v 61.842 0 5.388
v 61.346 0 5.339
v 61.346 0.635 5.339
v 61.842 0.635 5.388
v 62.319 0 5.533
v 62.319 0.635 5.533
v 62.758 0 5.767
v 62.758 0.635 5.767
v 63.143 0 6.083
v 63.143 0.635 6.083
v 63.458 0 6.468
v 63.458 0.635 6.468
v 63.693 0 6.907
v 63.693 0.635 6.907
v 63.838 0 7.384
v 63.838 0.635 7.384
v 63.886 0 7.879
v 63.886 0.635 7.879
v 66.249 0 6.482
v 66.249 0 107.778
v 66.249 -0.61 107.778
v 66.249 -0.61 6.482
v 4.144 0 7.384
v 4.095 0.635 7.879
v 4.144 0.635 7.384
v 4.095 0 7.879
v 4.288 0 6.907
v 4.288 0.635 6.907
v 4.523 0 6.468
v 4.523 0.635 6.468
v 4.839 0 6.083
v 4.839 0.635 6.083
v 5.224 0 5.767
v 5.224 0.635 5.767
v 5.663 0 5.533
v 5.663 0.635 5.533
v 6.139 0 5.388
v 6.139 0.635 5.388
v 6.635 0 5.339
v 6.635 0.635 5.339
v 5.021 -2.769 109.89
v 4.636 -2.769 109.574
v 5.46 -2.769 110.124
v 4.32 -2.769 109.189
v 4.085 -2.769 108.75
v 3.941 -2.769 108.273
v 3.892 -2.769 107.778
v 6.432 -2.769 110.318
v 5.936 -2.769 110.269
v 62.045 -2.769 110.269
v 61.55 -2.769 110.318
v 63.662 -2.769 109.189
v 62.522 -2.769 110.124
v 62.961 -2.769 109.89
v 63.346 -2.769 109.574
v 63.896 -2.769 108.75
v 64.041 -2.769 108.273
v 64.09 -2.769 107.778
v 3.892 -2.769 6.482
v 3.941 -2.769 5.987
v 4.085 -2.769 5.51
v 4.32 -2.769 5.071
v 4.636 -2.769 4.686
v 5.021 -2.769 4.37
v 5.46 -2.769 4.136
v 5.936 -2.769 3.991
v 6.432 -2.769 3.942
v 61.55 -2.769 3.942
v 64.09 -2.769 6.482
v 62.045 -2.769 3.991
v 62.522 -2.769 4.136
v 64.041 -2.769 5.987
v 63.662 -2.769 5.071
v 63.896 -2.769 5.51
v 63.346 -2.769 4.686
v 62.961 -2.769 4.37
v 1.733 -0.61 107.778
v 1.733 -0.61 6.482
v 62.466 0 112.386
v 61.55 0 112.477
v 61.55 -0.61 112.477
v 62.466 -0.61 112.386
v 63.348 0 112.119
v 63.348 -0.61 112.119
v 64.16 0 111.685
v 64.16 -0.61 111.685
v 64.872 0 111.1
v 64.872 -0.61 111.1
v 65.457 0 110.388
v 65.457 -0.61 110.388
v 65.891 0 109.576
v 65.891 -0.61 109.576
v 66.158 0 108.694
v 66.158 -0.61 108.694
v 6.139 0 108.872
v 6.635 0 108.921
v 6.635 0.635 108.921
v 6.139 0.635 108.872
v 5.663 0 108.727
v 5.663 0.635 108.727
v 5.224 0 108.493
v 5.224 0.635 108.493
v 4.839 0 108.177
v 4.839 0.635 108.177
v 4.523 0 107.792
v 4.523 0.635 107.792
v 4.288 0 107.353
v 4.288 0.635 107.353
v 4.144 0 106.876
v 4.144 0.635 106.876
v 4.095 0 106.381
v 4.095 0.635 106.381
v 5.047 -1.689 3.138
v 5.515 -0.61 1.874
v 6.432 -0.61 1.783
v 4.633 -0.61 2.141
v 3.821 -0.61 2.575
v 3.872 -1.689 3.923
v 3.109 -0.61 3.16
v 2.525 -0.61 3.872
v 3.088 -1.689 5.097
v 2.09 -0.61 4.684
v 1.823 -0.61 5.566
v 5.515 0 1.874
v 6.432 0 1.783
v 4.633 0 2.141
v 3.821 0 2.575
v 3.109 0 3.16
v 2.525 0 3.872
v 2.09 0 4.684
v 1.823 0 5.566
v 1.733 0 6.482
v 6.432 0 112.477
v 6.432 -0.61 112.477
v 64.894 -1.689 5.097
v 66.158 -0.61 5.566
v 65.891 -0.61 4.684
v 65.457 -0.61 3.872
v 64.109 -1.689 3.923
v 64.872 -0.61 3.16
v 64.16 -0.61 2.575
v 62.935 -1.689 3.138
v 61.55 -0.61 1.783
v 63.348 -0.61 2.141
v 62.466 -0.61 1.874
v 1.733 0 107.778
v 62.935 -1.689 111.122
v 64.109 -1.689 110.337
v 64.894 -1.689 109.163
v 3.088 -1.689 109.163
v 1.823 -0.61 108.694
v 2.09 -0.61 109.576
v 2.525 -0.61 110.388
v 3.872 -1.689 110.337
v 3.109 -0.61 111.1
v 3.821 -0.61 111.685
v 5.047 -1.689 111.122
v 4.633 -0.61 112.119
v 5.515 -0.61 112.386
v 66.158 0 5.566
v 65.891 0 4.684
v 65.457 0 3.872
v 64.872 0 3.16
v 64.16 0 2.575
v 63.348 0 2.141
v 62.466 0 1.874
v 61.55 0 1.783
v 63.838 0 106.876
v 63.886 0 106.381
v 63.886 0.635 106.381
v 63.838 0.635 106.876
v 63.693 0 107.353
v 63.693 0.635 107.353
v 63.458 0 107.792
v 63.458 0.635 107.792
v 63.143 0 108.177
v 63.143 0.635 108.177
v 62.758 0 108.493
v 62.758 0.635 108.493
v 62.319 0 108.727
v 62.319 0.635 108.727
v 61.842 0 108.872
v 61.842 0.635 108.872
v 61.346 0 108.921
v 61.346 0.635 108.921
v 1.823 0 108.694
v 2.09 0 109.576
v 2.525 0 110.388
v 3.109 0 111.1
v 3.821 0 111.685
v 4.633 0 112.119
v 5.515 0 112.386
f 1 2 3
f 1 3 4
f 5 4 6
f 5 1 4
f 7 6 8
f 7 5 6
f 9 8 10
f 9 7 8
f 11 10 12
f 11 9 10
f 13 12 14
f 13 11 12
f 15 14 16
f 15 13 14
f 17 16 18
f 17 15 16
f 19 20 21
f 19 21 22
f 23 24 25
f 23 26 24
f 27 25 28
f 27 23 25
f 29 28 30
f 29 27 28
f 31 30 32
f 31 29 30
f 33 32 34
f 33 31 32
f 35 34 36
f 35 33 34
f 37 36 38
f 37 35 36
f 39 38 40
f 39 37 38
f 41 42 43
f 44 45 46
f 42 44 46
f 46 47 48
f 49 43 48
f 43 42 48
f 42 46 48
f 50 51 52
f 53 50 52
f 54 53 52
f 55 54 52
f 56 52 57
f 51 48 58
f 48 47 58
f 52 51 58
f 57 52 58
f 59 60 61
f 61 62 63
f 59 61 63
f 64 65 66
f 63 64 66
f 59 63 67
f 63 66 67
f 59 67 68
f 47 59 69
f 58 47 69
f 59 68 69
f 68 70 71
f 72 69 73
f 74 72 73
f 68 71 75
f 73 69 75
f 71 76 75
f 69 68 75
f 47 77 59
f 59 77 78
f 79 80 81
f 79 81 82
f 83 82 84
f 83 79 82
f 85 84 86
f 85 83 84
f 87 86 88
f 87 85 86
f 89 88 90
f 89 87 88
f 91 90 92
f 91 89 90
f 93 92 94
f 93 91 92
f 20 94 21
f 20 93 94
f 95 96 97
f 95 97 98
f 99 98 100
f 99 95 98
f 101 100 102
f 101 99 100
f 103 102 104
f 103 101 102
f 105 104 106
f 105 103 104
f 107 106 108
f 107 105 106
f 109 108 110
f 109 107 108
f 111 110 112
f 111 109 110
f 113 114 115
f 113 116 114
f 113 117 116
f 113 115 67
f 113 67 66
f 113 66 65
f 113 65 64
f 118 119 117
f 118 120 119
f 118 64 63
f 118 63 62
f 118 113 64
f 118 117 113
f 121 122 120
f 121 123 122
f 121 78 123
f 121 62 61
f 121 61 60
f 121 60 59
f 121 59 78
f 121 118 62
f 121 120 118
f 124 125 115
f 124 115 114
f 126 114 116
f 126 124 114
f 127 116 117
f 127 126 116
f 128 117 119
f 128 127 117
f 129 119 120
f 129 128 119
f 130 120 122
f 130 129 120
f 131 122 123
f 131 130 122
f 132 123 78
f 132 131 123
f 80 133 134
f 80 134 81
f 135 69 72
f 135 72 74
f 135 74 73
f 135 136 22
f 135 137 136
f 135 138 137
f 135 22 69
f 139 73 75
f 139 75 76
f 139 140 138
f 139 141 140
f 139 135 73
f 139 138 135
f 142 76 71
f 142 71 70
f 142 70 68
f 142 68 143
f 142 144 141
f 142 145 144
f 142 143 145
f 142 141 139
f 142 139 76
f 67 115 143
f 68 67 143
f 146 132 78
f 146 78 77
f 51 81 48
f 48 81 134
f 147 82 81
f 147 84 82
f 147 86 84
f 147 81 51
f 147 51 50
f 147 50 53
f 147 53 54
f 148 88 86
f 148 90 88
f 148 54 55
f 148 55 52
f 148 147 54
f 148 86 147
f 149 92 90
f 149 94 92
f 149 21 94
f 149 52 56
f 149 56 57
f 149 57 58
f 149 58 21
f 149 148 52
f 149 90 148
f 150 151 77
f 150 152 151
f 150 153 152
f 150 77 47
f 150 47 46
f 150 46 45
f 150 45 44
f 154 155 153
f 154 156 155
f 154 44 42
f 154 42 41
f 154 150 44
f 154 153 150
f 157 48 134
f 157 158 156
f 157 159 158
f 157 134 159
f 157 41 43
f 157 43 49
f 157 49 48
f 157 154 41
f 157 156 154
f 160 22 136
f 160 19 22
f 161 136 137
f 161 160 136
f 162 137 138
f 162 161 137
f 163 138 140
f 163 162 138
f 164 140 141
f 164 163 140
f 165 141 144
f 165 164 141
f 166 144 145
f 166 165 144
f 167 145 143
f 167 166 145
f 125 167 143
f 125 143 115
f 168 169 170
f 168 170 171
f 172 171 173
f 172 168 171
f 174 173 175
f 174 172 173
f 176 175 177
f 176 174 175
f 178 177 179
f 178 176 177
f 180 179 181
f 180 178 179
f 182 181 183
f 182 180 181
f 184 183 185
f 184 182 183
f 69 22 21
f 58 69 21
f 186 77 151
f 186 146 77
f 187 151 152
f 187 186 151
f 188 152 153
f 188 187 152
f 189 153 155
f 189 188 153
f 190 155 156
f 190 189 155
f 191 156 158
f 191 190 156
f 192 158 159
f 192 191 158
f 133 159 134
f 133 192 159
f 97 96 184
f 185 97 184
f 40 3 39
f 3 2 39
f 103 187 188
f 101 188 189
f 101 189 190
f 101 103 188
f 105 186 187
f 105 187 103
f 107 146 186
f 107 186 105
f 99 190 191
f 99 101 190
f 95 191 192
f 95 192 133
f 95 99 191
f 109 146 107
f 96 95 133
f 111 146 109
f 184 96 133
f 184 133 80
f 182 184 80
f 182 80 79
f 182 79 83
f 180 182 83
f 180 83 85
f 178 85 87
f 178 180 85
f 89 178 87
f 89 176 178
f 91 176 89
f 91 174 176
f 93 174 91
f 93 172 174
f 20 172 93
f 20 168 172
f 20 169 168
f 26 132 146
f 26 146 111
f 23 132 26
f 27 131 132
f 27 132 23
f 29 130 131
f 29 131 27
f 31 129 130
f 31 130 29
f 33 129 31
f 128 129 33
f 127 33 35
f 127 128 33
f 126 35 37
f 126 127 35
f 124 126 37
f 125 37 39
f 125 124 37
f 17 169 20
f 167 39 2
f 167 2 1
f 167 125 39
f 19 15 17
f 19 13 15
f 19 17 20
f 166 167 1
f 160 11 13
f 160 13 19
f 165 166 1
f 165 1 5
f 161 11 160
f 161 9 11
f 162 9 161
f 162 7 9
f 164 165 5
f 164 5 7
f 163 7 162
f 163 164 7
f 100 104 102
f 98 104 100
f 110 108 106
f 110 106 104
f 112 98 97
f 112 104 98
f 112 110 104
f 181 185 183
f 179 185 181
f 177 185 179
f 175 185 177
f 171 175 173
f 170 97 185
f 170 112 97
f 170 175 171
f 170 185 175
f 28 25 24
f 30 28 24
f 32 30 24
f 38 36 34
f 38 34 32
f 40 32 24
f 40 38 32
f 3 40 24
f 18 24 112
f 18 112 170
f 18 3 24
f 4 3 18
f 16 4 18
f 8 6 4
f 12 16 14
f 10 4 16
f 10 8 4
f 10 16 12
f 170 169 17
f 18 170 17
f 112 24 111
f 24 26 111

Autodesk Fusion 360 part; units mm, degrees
sketch "Sketch1" plane through (0, 0, 0) normal (0, 1, 0) x (1, 0, 0) in component "2004745"
  line L0 (-11.1431, -112.4766) -> (81.2494, -112.4766) construction
  line L1 (-9.4032, -1.7834) -> (86.6433, -1.7834) construction
  line L2 (1.7327, -120.1324) -> (1.7327, 13.1495) construction
  line L3 (66.2487, -119.4365) -> (66.2487, -6.4824) construction
  line L4 (6.4317, -112.4766) -> (61.5497, -112.4766)
  line L5 (66.2487, -107.7776) -> (66.2487, -1.7834)
  line L6 (61.5497, -1.7834) -> (6.4317, -1.7834)
  line L7 (1.7327, -6.4824) -> (1.7327, -107.7776)
  arc A0 (6.4317, -1.7834) -> (1.7327, -6.4824) centre (6.4317, -6.4824) ccw
  arc A1 (66.2487, -6.4824) -> (61.5497, -1.7834) centre (61.5497, -6.4824) ccw
  arc A2 (1.7327, -107.7776) -> (6.4317, -112.4766) centre (6.4317, -107.7776) ccw
  arc A3 (61.5497, -112.4766) -> (66.2487, -107.7776) centre (61.5497, -107.7776) ccw
  line L8 (61.3465, -5.3394) -> (-4.4719, -5.3394) construction
  line L9 (76.7415, -108.9206) -> (-6.2738, -108.9206) construction
  line L10 (4.0949, 11.0388) -> (4.0949, -121.0301) construction
  line L11 (63.8865, 2.5767) -> (63.8865, -121.3323) construction
  line L12 (6.6349, -108.9206) -> (61.3465, -108.9206)
  line L13 (63.8865, -106.3806) -> (63.8865, -7.8794)
  line L14 (63.8865, -5.3394) -> (6.6349, -5.3394)
  line L15 (4.0949, -7.8794) -> (4.0949, -106.3806)
  arc A4 (4.0949, -106.3806) -> (6.6349, -108.9206) centre (6.6349, -106.3806) ccw
  arc A5 (61.3465, -108.9206) -> (63.8865, -106.3806) centre (61.3465, -106.3806) ccw
  arc A6 (6.6349, -5.3394) -> (4.0949, -7.8794) centre (6.6349, -7.8794) ccw
  arc A7 (63.8865, -7.8794) -> (61.3465, -5.3394) centre (61.3465, -7.8794) ccw
  dimension "d1" = 110.6932
  dimension "d2" = 64.516
  dimension "d3" = 4.699
  dimension "d4" = 4.699
  dimension "d5" = 4.699
  dimension "d6" = 4.699
  dimension "d7" = 3.556
  dimension "d8" = 3.556
  dimension "d9" = 2.3622
  dimension "d10" = 2.3622
  dimension "d11" = 2.54
  dimension "d12" = 2.54
  dimension "d13" = 2.54
  dimension "d14" = 2.54
extrude "Extrude1" add sketch "Sketch1" along normal blind 0.635 contours L12 L13 L14 L15 A4 A5 A6 A7 in component "2004745"
extrude "Extrude2" add sketch "Sketch1" against normal blind 2.7686 contours L4 L5 L6 L7 A0 A1 A2 A3 | L12 L13 L14 L15 A4 A5 A6 A7 in component "2004745"
chamfer "Chamfer1" distance 2.159 angle 45 8 edges at (33.9907, -2.7686, 1.7834) (64.8723, -2.7686, 3.1597) (66.2487, -2.7686, 57.13) (64.8723, -2.7686, 111.1003) (33.9907, -2.7686, 112.4766) (3.109, -2.7686, 111.1003) (1.7327, -2.7686, 57.13) (3.109, -2.7686, 3.1597) in component "2004745"
component "2004745" placed x (1, 0, 0) y (0, 1, 0) z (0, 0, 1) at (0, 0, 0)
equation "d17 = -0.134 in + 0.025 in"
